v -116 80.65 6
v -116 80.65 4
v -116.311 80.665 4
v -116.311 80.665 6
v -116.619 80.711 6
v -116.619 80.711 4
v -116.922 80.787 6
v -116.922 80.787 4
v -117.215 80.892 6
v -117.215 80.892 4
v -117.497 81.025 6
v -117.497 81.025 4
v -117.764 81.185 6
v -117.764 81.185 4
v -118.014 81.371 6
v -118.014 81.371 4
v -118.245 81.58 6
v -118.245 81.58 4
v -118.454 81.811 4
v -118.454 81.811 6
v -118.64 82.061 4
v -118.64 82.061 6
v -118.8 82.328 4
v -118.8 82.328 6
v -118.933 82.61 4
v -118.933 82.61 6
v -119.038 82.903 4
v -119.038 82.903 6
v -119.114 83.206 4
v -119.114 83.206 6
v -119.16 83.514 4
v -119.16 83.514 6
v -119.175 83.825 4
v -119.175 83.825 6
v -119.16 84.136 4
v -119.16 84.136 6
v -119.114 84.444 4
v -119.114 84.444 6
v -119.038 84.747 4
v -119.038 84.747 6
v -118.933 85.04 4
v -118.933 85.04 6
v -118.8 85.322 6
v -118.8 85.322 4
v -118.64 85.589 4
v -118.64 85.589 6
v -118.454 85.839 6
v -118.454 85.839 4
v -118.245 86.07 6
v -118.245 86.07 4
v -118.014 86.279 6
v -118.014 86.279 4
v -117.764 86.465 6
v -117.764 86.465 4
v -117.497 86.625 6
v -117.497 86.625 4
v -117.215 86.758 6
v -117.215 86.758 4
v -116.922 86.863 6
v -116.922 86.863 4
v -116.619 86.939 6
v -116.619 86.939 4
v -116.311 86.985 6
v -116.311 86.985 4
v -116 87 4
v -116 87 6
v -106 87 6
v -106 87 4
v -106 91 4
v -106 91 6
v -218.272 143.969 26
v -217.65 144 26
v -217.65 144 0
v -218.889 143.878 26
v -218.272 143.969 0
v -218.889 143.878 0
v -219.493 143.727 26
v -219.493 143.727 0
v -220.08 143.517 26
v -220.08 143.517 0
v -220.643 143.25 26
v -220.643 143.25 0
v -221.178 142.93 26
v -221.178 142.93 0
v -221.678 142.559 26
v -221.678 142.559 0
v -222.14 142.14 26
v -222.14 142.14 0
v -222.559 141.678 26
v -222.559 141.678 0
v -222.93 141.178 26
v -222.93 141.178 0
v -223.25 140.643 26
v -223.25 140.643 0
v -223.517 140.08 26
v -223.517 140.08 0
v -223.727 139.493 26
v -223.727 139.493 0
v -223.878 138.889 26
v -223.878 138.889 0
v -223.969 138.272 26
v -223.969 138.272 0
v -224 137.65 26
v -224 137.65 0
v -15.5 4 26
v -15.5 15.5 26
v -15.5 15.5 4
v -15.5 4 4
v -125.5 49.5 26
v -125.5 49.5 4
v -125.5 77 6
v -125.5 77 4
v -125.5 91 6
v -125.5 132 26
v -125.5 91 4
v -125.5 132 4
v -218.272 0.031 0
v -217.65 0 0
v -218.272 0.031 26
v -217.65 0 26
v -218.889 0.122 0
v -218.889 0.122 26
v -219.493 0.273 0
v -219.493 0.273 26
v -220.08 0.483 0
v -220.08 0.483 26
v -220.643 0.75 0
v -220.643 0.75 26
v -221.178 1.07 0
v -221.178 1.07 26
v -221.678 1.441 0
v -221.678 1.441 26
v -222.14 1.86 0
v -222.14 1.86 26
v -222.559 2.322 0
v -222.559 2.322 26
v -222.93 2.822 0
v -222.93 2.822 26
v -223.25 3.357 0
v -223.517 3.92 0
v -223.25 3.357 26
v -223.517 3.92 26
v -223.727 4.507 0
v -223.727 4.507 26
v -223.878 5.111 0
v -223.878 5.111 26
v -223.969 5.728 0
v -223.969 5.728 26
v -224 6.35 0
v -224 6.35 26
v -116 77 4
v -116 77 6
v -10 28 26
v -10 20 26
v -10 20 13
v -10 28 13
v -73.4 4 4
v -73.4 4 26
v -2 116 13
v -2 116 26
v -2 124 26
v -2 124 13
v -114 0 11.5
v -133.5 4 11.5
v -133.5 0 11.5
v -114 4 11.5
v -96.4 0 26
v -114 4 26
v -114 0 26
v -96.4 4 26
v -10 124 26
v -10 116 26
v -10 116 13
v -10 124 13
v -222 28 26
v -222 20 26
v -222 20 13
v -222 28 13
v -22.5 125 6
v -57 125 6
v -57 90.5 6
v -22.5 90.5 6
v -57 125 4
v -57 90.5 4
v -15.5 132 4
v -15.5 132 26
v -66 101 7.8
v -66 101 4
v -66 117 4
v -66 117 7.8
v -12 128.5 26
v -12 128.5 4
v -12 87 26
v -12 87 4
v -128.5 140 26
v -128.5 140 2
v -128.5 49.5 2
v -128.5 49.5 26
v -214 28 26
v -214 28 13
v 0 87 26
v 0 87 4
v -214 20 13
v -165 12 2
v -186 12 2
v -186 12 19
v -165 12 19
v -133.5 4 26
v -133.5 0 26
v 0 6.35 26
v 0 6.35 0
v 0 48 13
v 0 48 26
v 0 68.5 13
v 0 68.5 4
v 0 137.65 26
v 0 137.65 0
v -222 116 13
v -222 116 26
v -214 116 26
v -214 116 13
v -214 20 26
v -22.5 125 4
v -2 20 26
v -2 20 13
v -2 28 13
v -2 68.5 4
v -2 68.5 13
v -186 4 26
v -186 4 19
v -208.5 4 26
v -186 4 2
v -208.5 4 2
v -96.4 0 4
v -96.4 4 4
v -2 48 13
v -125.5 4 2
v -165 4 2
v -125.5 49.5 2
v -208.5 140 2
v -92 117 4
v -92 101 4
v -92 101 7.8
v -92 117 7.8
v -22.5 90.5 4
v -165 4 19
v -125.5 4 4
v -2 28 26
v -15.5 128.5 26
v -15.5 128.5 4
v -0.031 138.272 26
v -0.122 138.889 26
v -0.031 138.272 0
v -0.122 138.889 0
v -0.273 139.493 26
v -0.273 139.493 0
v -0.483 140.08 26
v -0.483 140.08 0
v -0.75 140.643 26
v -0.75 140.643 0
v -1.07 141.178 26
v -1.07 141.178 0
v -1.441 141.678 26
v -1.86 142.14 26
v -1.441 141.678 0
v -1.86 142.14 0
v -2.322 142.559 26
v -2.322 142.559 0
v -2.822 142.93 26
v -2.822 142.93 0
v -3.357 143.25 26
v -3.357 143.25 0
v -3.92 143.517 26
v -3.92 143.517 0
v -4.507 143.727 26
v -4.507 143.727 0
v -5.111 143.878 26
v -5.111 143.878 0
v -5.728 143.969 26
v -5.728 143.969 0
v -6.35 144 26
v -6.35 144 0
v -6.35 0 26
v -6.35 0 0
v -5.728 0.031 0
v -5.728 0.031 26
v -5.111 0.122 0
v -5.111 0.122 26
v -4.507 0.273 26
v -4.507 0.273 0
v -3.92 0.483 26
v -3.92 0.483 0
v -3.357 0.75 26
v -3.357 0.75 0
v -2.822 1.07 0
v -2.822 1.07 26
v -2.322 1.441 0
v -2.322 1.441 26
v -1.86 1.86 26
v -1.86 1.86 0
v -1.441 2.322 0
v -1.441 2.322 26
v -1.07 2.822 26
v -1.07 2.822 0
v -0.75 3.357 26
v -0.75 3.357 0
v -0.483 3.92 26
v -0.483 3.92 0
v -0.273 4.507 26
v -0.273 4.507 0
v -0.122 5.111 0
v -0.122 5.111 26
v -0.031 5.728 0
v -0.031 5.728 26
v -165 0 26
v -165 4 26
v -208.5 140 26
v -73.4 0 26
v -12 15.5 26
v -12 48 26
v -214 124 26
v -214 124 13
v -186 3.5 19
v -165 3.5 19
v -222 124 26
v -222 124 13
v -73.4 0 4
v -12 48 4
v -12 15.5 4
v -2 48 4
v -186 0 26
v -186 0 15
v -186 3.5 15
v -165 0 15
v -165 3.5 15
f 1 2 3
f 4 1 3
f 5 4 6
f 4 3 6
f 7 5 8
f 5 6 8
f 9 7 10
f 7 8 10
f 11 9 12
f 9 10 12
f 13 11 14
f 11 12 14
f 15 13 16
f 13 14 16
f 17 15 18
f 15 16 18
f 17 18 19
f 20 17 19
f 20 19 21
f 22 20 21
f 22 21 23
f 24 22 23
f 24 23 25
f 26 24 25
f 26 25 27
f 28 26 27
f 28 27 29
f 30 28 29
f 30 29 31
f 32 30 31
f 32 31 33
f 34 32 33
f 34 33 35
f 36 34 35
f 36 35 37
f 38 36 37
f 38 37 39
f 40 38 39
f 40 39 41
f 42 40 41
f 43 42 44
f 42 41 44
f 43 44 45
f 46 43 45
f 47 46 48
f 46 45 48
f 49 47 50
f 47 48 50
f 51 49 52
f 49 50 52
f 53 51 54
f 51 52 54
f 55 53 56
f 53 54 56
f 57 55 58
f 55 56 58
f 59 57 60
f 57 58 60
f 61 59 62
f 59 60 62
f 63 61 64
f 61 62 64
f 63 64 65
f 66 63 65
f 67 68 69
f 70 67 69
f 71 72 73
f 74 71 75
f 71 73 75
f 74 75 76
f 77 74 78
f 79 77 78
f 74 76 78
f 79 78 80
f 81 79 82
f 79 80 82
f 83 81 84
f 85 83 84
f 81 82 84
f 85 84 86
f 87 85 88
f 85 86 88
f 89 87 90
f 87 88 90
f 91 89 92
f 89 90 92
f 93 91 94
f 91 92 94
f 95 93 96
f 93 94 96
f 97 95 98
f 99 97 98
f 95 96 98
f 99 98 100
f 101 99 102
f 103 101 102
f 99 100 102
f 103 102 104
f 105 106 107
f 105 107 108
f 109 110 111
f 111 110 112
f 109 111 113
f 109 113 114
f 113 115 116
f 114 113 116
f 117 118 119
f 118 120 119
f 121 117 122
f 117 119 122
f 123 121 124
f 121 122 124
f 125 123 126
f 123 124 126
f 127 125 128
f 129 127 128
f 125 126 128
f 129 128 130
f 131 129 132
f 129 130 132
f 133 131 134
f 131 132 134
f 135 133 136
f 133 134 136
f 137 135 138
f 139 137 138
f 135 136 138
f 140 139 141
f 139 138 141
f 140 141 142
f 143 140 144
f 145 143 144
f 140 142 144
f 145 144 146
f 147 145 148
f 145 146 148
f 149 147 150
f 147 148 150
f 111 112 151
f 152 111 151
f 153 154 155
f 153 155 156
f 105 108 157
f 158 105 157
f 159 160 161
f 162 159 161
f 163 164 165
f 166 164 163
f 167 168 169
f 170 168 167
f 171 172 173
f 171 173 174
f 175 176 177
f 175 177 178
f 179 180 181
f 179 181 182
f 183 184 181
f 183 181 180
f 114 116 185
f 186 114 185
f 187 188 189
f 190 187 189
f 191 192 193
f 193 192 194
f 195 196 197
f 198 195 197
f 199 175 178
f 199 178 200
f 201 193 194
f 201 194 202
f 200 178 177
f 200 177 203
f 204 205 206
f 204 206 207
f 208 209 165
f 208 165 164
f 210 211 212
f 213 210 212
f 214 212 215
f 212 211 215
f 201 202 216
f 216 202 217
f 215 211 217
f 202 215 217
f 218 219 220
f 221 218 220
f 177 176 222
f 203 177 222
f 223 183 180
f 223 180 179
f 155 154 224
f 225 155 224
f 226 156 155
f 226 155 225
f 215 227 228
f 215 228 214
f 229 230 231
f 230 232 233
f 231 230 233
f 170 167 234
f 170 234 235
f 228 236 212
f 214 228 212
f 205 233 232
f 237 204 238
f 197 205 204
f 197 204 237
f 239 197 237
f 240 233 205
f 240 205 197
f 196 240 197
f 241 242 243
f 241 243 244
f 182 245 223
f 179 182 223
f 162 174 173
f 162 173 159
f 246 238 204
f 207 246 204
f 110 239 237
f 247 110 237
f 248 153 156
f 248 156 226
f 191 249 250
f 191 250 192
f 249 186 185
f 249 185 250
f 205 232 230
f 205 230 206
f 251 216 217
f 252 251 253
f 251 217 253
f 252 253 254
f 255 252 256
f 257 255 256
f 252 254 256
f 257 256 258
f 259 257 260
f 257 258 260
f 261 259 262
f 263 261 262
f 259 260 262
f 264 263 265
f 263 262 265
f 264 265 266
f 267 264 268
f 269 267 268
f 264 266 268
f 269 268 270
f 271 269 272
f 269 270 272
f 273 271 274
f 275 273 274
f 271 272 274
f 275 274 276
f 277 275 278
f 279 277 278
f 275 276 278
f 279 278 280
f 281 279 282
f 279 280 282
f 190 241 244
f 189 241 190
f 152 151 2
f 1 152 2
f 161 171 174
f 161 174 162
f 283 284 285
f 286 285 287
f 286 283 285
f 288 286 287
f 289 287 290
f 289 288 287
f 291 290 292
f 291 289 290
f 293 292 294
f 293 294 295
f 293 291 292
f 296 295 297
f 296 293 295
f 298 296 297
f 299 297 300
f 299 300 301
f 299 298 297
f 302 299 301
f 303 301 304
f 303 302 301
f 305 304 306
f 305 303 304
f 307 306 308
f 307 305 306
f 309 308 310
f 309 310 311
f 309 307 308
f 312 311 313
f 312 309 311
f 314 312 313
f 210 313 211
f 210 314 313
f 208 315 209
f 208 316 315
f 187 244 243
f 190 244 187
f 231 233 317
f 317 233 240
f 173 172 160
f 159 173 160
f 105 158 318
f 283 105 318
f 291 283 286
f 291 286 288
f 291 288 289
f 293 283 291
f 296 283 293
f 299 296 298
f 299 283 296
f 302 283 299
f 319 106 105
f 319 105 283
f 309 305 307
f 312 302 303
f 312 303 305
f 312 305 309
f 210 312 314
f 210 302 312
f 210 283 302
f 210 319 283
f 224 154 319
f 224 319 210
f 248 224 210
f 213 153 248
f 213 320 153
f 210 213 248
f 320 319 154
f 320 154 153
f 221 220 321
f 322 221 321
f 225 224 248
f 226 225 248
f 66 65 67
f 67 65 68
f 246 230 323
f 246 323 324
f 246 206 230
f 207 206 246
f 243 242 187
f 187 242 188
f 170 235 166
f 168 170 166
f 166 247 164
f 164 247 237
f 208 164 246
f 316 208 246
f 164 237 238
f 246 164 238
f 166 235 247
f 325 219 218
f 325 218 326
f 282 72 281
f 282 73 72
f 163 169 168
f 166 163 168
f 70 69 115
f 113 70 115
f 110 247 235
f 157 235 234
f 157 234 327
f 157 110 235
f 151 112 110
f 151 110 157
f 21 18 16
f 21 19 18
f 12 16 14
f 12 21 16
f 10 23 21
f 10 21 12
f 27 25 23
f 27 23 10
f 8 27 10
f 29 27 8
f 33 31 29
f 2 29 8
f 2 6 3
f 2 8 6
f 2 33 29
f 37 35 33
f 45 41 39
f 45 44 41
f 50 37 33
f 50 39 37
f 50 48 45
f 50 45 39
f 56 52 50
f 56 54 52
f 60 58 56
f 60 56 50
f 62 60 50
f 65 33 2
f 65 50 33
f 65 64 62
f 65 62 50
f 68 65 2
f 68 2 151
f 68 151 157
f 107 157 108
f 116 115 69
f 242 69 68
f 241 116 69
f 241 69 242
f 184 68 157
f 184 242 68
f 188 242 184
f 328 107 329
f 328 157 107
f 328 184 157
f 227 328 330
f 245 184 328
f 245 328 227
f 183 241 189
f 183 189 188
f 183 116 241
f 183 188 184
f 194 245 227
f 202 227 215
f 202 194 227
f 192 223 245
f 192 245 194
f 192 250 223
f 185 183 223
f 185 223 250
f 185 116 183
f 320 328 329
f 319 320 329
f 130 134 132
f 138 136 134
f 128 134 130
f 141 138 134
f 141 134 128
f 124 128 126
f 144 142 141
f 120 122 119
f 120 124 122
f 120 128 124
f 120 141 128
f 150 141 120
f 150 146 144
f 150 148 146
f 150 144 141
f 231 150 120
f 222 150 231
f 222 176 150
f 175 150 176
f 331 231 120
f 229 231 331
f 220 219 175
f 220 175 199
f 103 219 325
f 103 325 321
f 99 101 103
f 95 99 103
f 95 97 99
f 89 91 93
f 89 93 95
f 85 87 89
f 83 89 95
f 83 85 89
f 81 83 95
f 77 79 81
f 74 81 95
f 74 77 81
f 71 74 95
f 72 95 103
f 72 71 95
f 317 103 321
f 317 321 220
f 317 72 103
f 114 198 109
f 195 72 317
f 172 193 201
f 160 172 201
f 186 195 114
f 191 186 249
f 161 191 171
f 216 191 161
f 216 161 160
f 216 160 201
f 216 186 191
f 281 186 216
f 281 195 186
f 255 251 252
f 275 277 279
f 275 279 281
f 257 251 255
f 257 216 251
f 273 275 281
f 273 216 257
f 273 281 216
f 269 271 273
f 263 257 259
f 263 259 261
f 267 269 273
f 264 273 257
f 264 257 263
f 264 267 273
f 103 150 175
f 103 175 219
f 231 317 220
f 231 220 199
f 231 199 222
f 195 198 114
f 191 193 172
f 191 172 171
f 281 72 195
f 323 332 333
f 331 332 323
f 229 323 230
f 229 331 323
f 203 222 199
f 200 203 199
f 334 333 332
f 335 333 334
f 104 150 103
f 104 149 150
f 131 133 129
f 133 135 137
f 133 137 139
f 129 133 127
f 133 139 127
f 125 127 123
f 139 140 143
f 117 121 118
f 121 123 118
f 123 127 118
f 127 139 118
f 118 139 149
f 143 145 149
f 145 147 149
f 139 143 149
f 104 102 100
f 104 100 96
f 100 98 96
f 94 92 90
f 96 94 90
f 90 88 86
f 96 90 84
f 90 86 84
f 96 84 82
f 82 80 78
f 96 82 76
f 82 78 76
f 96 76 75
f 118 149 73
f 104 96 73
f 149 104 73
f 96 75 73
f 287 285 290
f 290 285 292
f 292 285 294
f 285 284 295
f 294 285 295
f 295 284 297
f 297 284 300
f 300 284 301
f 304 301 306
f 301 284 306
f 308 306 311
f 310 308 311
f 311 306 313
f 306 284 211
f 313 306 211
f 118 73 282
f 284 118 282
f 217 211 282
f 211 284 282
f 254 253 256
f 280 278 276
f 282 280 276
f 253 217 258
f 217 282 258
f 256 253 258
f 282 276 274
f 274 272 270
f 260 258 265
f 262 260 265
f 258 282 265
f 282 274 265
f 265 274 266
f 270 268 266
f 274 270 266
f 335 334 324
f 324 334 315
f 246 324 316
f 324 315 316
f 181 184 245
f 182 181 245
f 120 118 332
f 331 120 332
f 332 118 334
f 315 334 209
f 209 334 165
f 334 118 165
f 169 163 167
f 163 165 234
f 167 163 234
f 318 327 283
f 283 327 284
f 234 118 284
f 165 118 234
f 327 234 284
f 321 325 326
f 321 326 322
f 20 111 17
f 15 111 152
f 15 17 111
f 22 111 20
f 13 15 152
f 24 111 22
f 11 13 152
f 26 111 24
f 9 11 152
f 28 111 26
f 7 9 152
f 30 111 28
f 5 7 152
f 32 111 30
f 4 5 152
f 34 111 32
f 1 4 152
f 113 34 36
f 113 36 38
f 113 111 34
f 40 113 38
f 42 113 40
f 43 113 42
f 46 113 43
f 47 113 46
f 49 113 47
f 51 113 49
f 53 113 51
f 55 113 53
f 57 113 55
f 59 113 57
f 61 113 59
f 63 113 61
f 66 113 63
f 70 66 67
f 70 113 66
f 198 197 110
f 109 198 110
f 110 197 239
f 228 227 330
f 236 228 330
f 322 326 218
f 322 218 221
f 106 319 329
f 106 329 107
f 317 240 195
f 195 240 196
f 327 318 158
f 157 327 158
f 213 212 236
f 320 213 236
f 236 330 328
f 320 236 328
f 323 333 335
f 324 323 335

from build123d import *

# Parameters (mm, degrees)
F0_W      = 8
F0_H      = 8
F0_W_2    = 17.6
F0_H_2    = 4
F0_W_3    = 31.5
F0_W_4    = 9.5
F0_H_3    = 37.5
F0_W_5    = 35
F0_H_4    = 34.5
F0_W_6    = 26
F0_H_5    = 15
F0_H_6    = 16
F0_H_7    = 5
F0_W_7    = 12
F0_H_8    = 37
F0_W_8    = 23
F1_DEPTH  = 2
F2_W      = 224
F2_H      = 144
F3_DEPTH  = 24
F4_W      = 21
F4_H      = 4
F5_DEPTH  = 11
F6_W      = 21
F6_H      = 8.5
F7_DEPTH  = 17
F8_R      = 6.35
F9_W      = 34.5
F9_H      = 34.5
F10_DEPTH = 4
F11_W     = 26
F11_H     = 16
F12_DEPTH = 5.8
F14_DEPTH = 4
F15_W     = 19.5
F15_H     = 4
F16_DEPTH = 14.5
F17_W     = 8
F17_H     = 8
F18_DEPTH = 13
F19_W     = 2
F19_H     = 20.5
F20_DEPTH = 13
F21_W     = 2
F21_H     = 18.5
F22_DEPTH = 22
F25_W     = 23
F25_H     = 4
F26_DEPTH = 22
F28_DEPTH = 2


with BuildPart() as f1:
    # F0 (on Top) → F1 (new body)
    with BuildSketch(Plane.XY):
        Polygon((-224, 144), (-224, 0), (-186, 0), (-186, 4), (-208.5, 4), (-208.5, 140), (-128.5, 140), (-128.5, 49.5), (-125.5, 49.5), (-125.5, 87), (-125.5, 132), (-90, 132), (-64, 132), (-15.5, 132), (-15.5, 128.5), (-12, 128.5), (-12, 87), (0, 87), (0, 144), align=None)
        with Locations((-218, 24)):
            Rectangle(F0_W, F0_H, mode=Mode.SUBTRACT)
        with Locations((-218, 120)):
            Rectangle(F0_W, F0_H, mode=Mode.SUBTRACT)
        with Locations((-6, 120)):
            Rectangle(F0_W, F0_H, mode=Mode.SUBTRACT)
        Polygon((-208.5, 4), (-186, 4), (-186, 12), (-165, 12), (-165, 4), (-133.5, 4), (-128.5, 4), (-128.5, 49.5), (-128.5, 140), (-208.5, 140), align=None)
        Polygon((-133.5, 4), (-133.5, 0), (-114, 0), (-114, 4), (-128.5, 4), align=None)
        with Locations((-105.2, 2)):
            Rectangle(F0_W_2, F0_H_2)
        with Locations((-149.25, 2)):
            Rectangle(F0_W_3, F0_H_2)
        Polygon((-186, 4), (-186, 0), (-165, 0), (-165, 4), (-165, 12), (-186, 12), align=None)
        with Locations((-120.75, 68.25)):
            Rectangle(F0_W_4, F0_H_3)
        Polygon((-116, 87), (-12, 87), (-12, 128.5), (-15.5, 128.5), (-15.5, 132), (-64, 132), (-64, 117), (-64, 101), (-64, 96), (-90, 96), (-90, 101), (-90, 117), (-90, 132), (-125.5, 132), (-125.5, 87), align=None)
        with Locations((-39.5, 107.75)):
            Rectangle(F0_W_5, F0_H_4, mode=Mode.SUBTRACT)
        with Locations((-77, 124.5)):
            Rectangle(F0_W_6, F0_H_5)
        with Locations((-77, 109)):
            Rectangle(F0_W_6, F0_H_6)
        with Locations((-77, 98.5)):
            Rectangle(F0_W_6, F0_H_7)
        with Locations((-39.5, 107.75)):
            Rectangle(F0_W_5, F0_H_4)
        with Locations((-6, 120)):
            Rectangle(F0_W, F0_H)
        with Locations((-218, 120)):
            Rectangle(F0_W, F0_H)
        with Locations((-218, 24)):
            Rectangle(F0_W, F0_H)
        with Locations((-6, 68.5)):
            Rectangle(F0_W_7, F0_H_8)
        Polygon((-12, 50), (-12, 87), (-116, 87), (-116, 49.5), (-125.5, 49.5), (-128.5, 49.5), (-128.5, 4), (-114, 4), (-96.4, 4), (-73.4, 4), (-15.5, 4), (-15.5, 15.5), (-12, 15.5), align=None)
        Polygon((0, 0), (0, 50), (-12, 50), (-12, 15.5), (-15.5, 15.5), (-15.5, 4), (-73.4, 4), (-73.4, 0), align=None)
        with Locations((-6, 24)):
            Rectangle(F0_W, F0_H, mode=Mode.SUBTRACT)
        with Locations((-6, 24)):
            Rectangle(F0_W, F0_H)
        with Locations((-84.9, 2)):
            Rectangle(F0_W_8, F0_H_2)
    extrude(amount=F1_DEPTH)

    # F2 (on face) → F3 (join)
    with BuildSketch(Plane.XY.offset(2)):
        with Locations((-112, 72)):
            Rectangle(F2_W, F2_H)
        Polygon((-208.5, 4), (-208.5, 140), (-128.5, 140), (-128.5, 49.5), (-125.5, 49.5), (-125.5, 132), (-15.5, 132), (-15.5, 128.5), (-12, 128.5), (-12, 87), (-2, 87), (-2, 50), (-2, 48), (-12, 48), (-12, 15.5), (-15.5, 15.5), (-15.5, 4), align=None, mode=Mode.SUBTRACT)
    extrude(amount=F3_DEPTH)

    # F4 (on face) → F5 (cut)
    with BuildSketch(Plane.XY.offset(26)):
        with Locations((-175.5, 2)):
            Rectangle(F4_W, F4_H)
    extrude(amount=-F5_DEPTH, mode=Mode.SUBTRACT)

    # F6 (on face) → F7 (join)
    with BuildSketch(Plane.XY.offset(2)):
        with Locations((-175.5, 7.75)):
            Rectangle(F6_W, F6_H)
    extrude(amount=F7_DEPTH)

    # F8
    f8_edges = [f1.edges().sort_by_distance(p)[0] for p in [
        (-224, 0, 13),
        (0, 0, 13),
        (0, 144, 13),
        (-224, 144, 13),
    ]]
    fillet(f8_edges, radius=F8_R)

    # F9 (on face) → F10 (join)
    with BuildSketch(Plane.XY.offset(2)):
        with Locations((-39.75, 107.75)):
            Rectangle(F9_W, F9_H)
    extrude(amount=F10_DEPTH)

    # F11 (on face) → F12 (join)
    with BuildSketch(Plane.XY.offset(2)):
        with Locations((-79, 109)):
            Rectangle(F11_W, F11_H)
    extrude(amount=F12_DEPTH)

    # F13 (on face) → F14 (join)
    with BuildSketch(Plane.XY.offset(2)):
        with BuildLine():
            ThreePointArc((-116, 80.65), (-119.175, 83.825), (-116, 87))
            Line((-116, 87), (-106, 87))
            Line((-106, 87), (-106, 91))
            Line((-106, 91), (-125.5, 91))
            Line((-125.5, 91), (-125.5, 77))
            Line((-125.5, 77), (-116, 77))
            Line((-116, 77), (-116, 80.65))
        make_face()
    extrude(amount=F14_DEPTH)

    # F15 (on face) → F16 (cut)
    with BuildSketch(Plane.XY.offset(26)):
        with Locations((-123.75, 2)):
            Rectangle(F15_W, F15_H)
    extrude(amount=-F16_DEPTH, mode=Mode.SUBTRACT)

    # F17 (on face) → F18 (cut)
    with BuildSketch(Plane.XY.offset(26)):
        with Locations((-218, 120)):
            Rectangle(F17_W, F17_H)
        with Locations((-6, 120)):
            Rectangle(F17_W, F17_H)
        with Locations((-218, 24)):
            Rectangle(F17_W, F17_H)
        with Locations((-6, 24)):
            Rectangle(F17_W, F17_H)
    extrude(amount=-F18_DEPTH, mode=Mode.SUBTRACT)

    # F19 (on face) → F20 (cut)
    with BuildSketch(Plane.XY.offset(26)):
        with Locations((-1, 58.25)):
            Rectangle(F19_W, F19_H)
    extrude(amount=-F20_DEPTH, mode=Mode.SUBTRACT)

    # F21 (on face) → F22 (cut)
    with BuildSketch(Plane.XY.offset(26)):
        with Locations((-1, 77.75)):
            Rectangle(F21_W, F21_H)
    extrude(amount=-F22_DEPTH, mode=Mode.SUBTRACT)

    # F25 (on face) → F26 (cut)
    with BuildSketch(Plane.XY.offset(26)):
        with Locations((-84.9, 2)):
            Rectangle(F25_W, F25_H)
    extrude(amount=-F26_DEPTH, mode=Mode.SUBTRACT)

    # F27 (on face) → F28 (join)
    with BuildSketch(Plane.XY.offset(2)):
        Polygon((-125.5, 132), (-125.5, 4), (-12, 4), (-12, 48), (-2, 48), (-2, 87), (-12, 87), (-12, 132), align=None)
    extrude(amount=F28_DEPTH)


solid = f1.part
